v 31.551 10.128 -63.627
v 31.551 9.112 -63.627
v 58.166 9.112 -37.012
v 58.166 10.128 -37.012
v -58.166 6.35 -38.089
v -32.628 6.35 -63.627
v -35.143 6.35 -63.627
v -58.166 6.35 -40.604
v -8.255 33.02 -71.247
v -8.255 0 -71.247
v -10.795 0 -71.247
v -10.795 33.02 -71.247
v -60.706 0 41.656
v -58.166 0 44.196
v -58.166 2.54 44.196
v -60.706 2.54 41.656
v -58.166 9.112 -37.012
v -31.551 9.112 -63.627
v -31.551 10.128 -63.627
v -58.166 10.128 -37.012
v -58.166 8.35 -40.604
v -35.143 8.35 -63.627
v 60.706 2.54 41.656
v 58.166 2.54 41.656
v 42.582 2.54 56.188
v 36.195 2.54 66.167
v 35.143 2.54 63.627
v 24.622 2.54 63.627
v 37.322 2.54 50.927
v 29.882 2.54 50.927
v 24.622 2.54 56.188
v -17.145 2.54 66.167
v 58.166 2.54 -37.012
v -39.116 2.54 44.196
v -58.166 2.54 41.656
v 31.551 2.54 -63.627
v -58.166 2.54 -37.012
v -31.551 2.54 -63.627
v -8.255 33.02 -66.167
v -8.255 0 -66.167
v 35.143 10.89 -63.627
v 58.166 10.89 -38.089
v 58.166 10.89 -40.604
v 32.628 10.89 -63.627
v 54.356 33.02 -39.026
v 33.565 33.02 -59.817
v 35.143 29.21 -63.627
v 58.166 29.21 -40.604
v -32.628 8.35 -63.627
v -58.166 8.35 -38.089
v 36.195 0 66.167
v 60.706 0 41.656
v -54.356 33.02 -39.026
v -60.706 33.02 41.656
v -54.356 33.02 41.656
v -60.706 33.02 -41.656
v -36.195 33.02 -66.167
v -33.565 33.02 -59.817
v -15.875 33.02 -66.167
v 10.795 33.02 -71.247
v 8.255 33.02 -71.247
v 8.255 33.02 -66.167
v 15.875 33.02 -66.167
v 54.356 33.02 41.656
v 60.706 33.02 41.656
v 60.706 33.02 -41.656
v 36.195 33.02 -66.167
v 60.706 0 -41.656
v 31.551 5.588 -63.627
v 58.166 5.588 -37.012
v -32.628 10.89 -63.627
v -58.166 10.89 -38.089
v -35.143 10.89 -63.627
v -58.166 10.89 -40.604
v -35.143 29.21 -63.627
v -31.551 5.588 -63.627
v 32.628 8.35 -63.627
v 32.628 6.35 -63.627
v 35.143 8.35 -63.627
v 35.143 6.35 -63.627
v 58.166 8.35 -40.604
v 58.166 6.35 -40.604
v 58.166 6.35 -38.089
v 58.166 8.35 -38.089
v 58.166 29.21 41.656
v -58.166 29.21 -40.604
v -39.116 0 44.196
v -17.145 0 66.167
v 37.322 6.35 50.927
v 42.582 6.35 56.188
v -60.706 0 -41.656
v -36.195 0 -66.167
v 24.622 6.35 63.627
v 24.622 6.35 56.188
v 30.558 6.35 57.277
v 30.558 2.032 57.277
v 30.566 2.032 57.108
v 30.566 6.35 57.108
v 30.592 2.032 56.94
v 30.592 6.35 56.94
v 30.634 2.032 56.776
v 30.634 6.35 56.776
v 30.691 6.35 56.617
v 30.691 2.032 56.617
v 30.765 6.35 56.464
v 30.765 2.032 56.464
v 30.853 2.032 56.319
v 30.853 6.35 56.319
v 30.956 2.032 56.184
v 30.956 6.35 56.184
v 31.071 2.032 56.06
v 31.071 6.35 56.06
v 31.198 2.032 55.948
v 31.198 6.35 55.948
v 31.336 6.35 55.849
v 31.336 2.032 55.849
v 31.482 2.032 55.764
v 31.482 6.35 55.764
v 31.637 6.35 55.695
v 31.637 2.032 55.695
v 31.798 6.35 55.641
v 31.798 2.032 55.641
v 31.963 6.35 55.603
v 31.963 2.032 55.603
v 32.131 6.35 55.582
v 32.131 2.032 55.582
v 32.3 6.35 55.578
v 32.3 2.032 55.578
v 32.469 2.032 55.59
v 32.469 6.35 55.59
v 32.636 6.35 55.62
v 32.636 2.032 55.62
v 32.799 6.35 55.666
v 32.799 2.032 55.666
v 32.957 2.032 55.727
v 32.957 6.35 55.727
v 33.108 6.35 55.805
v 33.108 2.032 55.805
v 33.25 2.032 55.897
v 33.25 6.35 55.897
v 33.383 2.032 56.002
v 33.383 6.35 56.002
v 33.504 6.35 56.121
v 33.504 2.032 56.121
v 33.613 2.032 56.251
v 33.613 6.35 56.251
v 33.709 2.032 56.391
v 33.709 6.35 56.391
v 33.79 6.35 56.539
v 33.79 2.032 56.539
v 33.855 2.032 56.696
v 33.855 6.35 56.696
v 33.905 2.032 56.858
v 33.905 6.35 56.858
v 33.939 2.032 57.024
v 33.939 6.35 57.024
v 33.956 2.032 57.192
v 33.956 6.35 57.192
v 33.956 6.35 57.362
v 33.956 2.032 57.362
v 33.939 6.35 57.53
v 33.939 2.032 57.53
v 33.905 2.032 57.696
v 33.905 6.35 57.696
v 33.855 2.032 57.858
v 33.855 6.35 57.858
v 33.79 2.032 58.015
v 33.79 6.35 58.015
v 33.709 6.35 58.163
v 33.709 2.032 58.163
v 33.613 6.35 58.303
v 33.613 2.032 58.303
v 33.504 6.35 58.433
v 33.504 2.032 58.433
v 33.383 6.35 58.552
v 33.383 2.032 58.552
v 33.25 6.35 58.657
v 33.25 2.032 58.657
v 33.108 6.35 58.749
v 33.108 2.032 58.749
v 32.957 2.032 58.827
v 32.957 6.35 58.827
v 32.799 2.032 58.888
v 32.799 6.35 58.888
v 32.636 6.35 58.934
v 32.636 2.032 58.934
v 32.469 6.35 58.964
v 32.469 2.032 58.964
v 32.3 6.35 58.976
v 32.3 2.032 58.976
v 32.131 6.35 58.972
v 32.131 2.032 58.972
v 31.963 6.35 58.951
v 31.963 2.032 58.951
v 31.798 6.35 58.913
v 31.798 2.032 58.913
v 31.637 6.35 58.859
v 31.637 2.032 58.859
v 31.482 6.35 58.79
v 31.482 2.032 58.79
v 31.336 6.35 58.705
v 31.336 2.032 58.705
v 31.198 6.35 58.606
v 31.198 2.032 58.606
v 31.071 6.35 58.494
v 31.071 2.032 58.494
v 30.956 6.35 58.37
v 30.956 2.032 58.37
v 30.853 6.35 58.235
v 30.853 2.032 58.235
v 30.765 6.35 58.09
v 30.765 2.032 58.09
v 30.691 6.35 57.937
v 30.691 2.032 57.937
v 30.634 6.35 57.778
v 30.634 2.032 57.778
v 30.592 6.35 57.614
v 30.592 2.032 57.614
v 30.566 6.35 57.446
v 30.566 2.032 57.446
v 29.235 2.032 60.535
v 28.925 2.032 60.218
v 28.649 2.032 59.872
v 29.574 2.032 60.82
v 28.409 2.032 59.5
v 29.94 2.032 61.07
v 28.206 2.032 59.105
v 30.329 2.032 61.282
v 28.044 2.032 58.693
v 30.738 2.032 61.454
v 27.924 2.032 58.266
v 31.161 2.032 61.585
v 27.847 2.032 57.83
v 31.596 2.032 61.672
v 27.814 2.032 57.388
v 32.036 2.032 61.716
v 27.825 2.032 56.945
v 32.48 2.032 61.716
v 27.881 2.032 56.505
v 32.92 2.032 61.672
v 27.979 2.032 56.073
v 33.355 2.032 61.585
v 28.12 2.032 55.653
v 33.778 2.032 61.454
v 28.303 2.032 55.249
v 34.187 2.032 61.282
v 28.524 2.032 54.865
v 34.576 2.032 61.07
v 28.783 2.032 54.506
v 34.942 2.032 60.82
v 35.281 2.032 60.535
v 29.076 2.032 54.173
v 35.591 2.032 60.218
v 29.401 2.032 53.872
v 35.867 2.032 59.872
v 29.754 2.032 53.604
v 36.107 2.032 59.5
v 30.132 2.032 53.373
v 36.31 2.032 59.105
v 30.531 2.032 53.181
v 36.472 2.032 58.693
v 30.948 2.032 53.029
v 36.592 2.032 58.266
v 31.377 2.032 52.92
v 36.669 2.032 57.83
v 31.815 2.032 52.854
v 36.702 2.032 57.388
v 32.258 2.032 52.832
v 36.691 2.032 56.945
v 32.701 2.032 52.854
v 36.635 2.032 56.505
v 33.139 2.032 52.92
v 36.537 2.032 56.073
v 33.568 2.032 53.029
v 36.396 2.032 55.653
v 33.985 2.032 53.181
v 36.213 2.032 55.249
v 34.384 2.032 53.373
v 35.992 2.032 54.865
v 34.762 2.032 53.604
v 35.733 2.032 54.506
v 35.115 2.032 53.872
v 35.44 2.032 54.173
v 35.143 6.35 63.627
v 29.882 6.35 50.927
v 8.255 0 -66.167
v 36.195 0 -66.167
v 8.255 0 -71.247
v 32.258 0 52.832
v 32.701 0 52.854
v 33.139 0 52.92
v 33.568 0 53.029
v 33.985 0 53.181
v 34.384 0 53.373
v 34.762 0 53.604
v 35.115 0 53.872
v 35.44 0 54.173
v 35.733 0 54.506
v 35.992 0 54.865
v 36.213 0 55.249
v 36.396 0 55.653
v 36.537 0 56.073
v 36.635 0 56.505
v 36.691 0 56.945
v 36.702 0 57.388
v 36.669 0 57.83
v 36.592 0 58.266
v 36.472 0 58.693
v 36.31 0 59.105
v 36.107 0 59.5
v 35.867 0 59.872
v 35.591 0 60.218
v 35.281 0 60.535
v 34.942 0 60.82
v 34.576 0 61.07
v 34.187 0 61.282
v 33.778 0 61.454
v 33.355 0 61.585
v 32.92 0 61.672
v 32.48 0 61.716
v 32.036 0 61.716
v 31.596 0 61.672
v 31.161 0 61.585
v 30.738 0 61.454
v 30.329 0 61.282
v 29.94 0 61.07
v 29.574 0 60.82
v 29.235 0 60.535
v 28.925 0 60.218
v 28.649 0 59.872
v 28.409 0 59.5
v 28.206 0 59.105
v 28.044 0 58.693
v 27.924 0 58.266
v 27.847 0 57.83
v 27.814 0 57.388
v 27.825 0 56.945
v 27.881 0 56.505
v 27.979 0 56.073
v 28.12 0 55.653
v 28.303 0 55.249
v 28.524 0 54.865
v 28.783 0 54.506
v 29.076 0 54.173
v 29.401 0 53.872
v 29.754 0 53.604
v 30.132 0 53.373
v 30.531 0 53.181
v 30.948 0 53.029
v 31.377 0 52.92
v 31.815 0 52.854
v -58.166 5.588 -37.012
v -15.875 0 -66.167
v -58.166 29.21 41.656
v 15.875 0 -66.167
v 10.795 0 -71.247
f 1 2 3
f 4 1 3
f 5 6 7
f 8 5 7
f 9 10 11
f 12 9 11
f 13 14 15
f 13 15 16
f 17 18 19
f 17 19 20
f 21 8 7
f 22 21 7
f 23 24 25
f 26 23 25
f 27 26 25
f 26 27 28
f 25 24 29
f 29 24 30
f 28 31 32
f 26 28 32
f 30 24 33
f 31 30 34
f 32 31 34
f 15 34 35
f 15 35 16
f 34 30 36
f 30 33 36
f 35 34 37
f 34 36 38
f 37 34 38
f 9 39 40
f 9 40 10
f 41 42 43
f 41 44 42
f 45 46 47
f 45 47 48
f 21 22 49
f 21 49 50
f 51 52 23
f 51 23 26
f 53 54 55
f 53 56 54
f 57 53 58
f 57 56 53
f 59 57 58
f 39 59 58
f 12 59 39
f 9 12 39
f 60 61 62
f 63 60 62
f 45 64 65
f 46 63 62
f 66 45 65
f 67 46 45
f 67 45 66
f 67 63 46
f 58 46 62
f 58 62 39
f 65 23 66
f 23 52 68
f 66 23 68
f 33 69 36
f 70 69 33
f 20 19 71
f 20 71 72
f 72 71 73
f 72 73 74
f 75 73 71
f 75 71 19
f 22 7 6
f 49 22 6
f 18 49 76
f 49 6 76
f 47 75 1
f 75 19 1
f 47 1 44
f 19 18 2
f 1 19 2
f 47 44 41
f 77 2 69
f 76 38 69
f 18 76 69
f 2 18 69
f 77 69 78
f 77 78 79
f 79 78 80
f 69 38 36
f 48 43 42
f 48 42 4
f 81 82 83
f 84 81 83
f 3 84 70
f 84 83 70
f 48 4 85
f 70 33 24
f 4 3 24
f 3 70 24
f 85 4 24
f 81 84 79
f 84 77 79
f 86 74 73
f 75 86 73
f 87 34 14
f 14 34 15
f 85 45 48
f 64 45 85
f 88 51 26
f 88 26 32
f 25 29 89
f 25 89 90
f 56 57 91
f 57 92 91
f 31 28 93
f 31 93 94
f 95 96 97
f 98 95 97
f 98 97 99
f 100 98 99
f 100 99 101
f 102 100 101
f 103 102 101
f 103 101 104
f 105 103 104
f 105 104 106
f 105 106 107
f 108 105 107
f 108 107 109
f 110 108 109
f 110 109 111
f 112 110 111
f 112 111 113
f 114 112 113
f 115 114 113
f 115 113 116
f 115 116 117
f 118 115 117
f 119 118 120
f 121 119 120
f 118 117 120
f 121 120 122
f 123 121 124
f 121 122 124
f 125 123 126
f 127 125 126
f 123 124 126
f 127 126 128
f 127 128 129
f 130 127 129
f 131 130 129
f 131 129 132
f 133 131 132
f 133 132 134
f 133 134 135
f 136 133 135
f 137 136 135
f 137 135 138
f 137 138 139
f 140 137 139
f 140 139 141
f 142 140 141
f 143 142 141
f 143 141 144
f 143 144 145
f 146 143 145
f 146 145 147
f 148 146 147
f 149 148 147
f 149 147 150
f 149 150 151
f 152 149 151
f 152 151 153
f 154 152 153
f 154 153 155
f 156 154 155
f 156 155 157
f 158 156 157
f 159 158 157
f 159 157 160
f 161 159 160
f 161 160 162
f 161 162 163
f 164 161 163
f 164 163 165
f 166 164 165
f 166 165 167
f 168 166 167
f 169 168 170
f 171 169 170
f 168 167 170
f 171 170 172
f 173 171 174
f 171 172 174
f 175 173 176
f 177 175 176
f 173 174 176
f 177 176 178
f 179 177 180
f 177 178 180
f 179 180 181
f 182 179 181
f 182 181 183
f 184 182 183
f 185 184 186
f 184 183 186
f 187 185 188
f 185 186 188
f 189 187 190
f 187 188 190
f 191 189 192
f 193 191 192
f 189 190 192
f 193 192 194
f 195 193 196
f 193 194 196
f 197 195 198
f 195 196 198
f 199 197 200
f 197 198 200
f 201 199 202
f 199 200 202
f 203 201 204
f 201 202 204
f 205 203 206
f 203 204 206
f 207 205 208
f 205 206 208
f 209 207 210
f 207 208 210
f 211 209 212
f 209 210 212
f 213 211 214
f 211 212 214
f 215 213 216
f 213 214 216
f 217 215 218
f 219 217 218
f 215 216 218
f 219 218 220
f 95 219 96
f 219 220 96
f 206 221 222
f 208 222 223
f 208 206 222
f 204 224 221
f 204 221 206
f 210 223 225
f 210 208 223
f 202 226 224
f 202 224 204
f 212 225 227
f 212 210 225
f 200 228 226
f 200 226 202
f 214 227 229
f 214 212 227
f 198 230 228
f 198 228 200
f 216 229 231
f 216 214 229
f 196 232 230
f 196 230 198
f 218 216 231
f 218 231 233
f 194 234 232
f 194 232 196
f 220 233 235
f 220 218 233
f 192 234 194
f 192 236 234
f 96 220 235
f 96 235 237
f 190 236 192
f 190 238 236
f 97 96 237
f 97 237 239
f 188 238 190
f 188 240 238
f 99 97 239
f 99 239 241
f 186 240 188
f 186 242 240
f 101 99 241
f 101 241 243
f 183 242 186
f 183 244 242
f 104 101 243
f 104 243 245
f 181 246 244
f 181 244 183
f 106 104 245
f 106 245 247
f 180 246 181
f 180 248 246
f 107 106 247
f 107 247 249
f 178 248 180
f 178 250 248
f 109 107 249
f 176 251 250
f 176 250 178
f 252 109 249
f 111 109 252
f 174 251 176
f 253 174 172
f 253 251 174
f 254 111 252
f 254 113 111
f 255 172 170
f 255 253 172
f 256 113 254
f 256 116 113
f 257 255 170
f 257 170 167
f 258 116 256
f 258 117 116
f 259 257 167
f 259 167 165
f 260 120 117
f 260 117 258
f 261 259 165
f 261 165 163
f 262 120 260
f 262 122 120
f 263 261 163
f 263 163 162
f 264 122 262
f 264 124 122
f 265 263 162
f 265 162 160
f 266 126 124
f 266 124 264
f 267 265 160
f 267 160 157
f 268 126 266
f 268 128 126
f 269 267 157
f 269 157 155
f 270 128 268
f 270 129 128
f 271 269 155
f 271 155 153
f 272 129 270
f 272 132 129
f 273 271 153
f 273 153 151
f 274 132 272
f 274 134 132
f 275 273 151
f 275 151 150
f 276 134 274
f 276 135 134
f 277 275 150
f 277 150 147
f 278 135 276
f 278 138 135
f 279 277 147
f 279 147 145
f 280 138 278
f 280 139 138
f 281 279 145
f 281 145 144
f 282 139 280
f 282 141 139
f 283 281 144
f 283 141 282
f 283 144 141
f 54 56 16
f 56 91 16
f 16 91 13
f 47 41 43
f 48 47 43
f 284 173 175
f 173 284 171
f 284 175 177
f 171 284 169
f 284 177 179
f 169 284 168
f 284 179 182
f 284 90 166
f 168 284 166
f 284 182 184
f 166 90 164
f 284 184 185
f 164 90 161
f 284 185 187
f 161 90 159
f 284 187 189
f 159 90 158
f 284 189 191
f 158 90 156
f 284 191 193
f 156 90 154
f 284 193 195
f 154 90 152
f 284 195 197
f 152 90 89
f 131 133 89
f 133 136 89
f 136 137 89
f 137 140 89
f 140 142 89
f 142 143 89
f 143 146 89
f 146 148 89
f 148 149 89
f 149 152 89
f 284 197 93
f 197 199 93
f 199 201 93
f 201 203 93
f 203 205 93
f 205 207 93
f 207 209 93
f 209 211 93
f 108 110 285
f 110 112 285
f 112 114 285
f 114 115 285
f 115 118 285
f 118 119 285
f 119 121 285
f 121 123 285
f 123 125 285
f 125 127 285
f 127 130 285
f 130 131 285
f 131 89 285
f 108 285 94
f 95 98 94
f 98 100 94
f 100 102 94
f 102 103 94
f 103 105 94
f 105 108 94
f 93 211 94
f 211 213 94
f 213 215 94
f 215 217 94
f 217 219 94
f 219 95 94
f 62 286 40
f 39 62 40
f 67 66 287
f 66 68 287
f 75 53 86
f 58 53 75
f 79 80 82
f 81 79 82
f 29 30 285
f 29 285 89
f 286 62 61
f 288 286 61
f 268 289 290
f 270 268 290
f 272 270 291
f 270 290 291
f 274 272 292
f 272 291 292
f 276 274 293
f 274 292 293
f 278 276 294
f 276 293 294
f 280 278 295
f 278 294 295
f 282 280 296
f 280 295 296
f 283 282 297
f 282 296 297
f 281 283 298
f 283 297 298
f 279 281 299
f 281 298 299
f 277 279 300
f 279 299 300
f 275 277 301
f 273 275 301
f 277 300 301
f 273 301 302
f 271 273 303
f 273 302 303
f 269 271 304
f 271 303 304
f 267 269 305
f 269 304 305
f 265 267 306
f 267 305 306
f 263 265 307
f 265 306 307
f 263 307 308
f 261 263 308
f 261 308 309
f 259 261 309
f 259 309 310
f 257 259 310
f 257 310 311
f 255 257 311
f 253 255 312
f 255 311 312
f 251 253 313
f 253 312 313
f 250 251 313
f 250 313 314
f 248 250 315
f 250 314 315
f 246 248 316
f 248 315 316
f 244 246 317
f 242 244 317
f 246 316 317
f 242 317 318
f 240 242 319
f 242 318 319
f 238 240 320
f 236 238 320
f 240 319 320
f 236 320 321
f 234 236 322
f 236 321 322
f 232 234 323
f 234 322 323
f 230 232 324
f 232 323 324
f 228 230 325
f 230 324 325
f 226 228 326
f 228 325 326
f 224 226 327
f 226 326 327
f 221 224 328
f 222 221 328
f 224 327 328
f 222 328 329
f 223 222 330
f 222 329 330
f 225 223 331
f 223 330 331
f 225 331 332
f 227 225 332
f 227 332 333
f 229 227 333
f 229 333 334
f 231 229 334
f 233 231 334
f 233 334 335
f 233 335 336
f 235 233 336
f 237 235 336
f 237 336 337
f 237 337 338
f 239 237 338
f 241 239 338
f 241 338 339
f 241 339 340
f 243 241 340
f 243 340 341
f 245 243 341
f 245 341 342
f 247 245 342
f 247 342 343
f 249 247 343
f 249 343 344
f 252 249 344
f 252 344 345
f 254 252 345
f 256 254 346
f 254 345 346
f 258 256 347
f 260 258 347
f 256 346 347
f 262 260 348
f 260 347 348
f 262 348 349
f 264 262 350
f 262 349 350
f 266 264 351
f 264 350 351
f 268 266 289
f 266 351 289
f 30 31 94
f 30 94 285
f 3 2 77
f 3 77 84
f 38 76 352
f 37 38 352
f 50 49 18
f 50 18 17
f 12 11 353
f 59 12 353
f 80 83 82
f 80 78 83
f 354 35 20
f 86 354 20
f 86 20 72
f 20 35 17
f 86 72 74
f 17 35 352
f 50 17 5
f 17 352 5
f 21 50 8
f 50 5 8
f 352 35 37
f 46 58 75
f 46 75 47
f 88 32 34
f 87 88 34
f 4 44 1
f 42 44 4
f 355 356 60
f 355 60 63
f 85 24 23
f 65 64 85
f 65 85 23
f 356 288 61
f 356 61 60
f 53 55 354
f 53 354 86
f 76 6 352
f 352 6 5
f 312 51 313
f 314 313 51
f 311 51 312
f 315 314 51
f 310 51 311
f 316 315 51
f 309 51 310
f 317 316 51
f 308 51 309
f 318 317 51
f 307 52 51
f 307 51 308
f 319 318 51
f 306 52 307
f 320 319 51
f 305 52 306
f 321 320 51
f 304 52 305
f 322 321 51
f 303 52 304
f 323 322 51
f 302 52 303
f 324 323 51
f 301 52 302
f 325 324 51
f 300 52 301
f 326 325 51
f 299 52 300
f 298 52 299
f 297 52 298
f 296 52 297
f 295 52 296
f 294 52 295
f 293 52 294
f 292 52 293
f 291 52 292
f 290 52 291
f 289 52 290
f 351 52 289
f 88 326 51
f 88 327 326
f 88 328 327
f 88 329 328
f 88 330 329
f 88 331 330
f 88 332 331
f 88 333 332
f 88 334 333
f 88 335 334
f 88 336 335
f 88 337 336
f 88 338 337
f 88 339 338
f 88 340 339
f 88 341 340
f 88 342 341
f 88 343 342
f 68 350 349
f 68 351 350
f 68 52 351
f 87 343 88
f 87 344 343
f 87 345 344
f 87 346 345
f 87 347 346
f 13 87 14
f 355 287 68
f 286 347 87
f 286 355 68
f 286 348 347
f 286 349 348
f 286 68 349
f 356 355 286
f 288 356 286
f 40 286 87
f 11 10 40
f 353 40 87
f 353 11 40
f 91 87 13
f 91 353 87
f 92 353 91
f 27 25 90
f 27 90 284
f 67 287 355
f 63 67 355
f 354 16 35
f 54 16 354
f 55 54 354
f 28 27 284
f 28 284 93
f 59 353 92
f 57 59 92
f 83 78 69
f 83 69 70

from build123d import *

# Parameters (mm, degrees)
BOSS_EXTRUDE1_DEPTH  = 2.54
BOSS_EXTRUDE2_DEPTH  = 30.48
CUT_EXTRUDE2_DEPTH   = 95.827847835
BOSS_EXTRUDE4_DEPTH  = 3.81
BOSS_EXTRUDE5_START  = 2
BOSS_EXTRUDE5_DEPTH  = 2.54
CHAMFER4_SIZE        = 0.762
BOSS_EXTRUDE6_DEPTH  = 3.81
M3_CLEARANCE_HOLE1_D = 3.4
SKETCH13_R           = 4.445
CUT_EXTRUDE3_DEPTH   = 2.032
BOSS_EXTRUDE3_DEPTH  = 3.81
CHAMFER2_SIZE        = 3.81
BOSS_EXTRUDE10_DEPTH = 33.02


with BuildPart() as part:
    # Sketch1 → Boss-Extrude1 (new body)
    with BuildSketch(Plane(origin=(0, 0, 0), x_dir=(1, 0, 0), z_dir=(0, 1, 0))):
        Polygon((-36.195, 66.167), (36.195, 66.167), (60.706, 41.656), (60.706, -41.656), (36.195, -66.167), (-36.195, -66.167), (-60.706, -41.656), (-60.706, 41.656), align=None)
    extrude(amount=BOSS_EXTRUDE1_DEPTH)

    # Sketch5 → Boss-Extrude2 (add)
    with BuildSketch(Plane(origin=(0, 2.54, 0), x_dir=(1, 0, 0), z_dir=(0, 1, 0))):
        Polygon((60.706, -41.656), (60.706, 41.656), (36.195, 66.167), (-36.195, 66.167), (-60.706, 41.656), (-60.706, -41.656), (-58.166, -41.656), (-58.166, 40.603897552), (-35.142897552, 63.627), (35.142897552, 63.627), (58.166, 40.603897552), (58.166, -41.656), align=None)
    extrude(amount=BOSS_EXTRUDE2_DEPTH)

    # Sketch8 → Cut-Extrude2 (cut, through all)
    with BuildSketch(Plane(origin=(0, 2.54, 0), x_dir=(1, 0, 0), z_dir=(0, 1, 0))):
        Polygon((-58.166, -44.196), (-36.195, -66.167), (-17.145, -66.167), (-39.116, -44.196), align=None)
    extrude(amount=-CUT_EXTRUDE2_DEPTH, mode=Mode.SUBTRACT)

    # Sketch9 → Boss-Extrude4 (add)
    with BuildSketch(Plane(origin=(0, 6.35, 0), x_dir=(1, 0, 0), z_dir=(0, 1, 0))):
        Polygon((-58.166, 40.603897552), (-35.142897552, 63.627), (-31.550795103, 63.627), (-58.166, 37.011795103), align=None)
        Polygon((31.550795103, 63.627), (58.166, 37.011795103), (58.166, 40.603897552), (35.142897552, 63.627), align=None)
    extrude(amount=-BOSS_EXTRUDE4_DEPTH)

    # Sketch9<3> → Boss-Extrude5 (add)
    with BuildSketch(Plane(origin=(0, 6.35, 0), x_dir=(1, 0, 0), z_dir=(0, 1, 0)).offset(BOSS_EXTRUDE5_START)):
        Polygon((-58.166, 40.603897552), (-35.142897552, 63.627), (-31.550795103, 63.627), (-58.166, 37.011795103), align=None)
        Polygon((31.550795103, 63.627), (58.166, 37.011795103), (58.166, 40.603897552), (35.142897552, 63.627), align=None)
    extrude(amount=BOSS_EXTRUDE5_DEPTH)

    # Chamfer4
    chamfer4_edges = [part.edges().sort_by_distance(p)[0] for p in [
        (-44.858397552, 10.89, -50.319397552),
        (-44.858397552, 8.35, -50.319397552),
        (44.858397552, 10.89, -50.319397552),
        (44.858397552, 8.35, -50.319397552),
        (-44.858397552, 6.35, -50.319397552),
        (44.858397552, 6.35, -50.319397552),
    ]]
    chamfer(chamfer4_edges, length=CHAMFER4_SIZE)

    # Sketch10 → Boss-Extrude6 (add)
    with BuildSketch(Plane(origin=(0, 2.54, 0), x_dir=(1, 0, 0), z_dir=(0, 1, 0))):
        Polygon((42.582385309, -56.187512242), (35.142897552, -63.627), (24.621873067, -63.627), (24.621873067, -56.187512242), (29.882385309, -50.927), (37.321873067, -50.927), align=None)
    extrude(amount=BOSS_EXTRUDE6_DEPTH)

    # M3 Clearance Hole1 (through all)
    with Locations(Plane(origin=(0, 6.35, 0), x_dir=(1, 0, 0), z_dir=(0, 1, 0))):
        with Locations((32.258, -57.277)):
            Hole(M3_CLEARANCE_HOLE1_D / 2)

    # Sketch13 → Cut-Extrude3 (cut)
    with BuildSketch(Plane.XZ):
        with Locations(Location((32.258, 57.277, 0), (0, 0, 270))):
            Circle(SKETCH13_R)
    extrude(amount=-CUT_EXTRUDE3_DEPTH, mode=Mode.SUBTRACT)

    # Sketch7 → Boss-Extrude3 (add)
    with BuildSketch(Plane(origin=(0, 33.02, 0), x_dir=(1, 0, 0), z_dir=(0, 1, 0))):
        Polygon((-58.166, -41.656), (-54.356, -41.656), (-54.356, 39.025743879), (-33.564743879, 59.817), (33.564743879, 59.817), (54.356, 39.025743879), (54.356, -41.656), (58.166, -41.656), (58.166, 40.603897552), (35.142897552, 63.627), (-35.142897552, 63.627), (-58.166, 40.603897552), align=None)
    extrude(amount=-BOSS_EXTRUDE3_DEPTH)

    # Chamfer2
    chamfer2_edges = [part.edges().sort_by_distance(p)[0] for p in [
        (54.356, 29.21, 1.315128061),
        (43.960371939, 29.21, -49.421371939),
        (0, 29.21, -59.817),
        (-43.960371939, 29.21, -49.421371939),
        (-54.356, 29.21, 1.315128061),
    ]]
    chamfer(chamfer2_edges, length=CHAMFER2_SIZE - 0.0001)  # a hair under: the kernel refuses the full size

    # Sketch14 → Boss-Extrude10 (add)
    with BuildSketch(Plane.XZ):
        Polygon((-8.255, -66.167), (-8.255, -71.247), (-10.795, -71.247), (-15.875, -66.167), align=None)
        Polygon((10.795, -71.247), (15.875, -66.167), (8.255, -66.167), (8.255, -71.247), align=None)
    extrude(amount=-BOSS_EXTRUDE10_DEPTH)


solid = part.part
